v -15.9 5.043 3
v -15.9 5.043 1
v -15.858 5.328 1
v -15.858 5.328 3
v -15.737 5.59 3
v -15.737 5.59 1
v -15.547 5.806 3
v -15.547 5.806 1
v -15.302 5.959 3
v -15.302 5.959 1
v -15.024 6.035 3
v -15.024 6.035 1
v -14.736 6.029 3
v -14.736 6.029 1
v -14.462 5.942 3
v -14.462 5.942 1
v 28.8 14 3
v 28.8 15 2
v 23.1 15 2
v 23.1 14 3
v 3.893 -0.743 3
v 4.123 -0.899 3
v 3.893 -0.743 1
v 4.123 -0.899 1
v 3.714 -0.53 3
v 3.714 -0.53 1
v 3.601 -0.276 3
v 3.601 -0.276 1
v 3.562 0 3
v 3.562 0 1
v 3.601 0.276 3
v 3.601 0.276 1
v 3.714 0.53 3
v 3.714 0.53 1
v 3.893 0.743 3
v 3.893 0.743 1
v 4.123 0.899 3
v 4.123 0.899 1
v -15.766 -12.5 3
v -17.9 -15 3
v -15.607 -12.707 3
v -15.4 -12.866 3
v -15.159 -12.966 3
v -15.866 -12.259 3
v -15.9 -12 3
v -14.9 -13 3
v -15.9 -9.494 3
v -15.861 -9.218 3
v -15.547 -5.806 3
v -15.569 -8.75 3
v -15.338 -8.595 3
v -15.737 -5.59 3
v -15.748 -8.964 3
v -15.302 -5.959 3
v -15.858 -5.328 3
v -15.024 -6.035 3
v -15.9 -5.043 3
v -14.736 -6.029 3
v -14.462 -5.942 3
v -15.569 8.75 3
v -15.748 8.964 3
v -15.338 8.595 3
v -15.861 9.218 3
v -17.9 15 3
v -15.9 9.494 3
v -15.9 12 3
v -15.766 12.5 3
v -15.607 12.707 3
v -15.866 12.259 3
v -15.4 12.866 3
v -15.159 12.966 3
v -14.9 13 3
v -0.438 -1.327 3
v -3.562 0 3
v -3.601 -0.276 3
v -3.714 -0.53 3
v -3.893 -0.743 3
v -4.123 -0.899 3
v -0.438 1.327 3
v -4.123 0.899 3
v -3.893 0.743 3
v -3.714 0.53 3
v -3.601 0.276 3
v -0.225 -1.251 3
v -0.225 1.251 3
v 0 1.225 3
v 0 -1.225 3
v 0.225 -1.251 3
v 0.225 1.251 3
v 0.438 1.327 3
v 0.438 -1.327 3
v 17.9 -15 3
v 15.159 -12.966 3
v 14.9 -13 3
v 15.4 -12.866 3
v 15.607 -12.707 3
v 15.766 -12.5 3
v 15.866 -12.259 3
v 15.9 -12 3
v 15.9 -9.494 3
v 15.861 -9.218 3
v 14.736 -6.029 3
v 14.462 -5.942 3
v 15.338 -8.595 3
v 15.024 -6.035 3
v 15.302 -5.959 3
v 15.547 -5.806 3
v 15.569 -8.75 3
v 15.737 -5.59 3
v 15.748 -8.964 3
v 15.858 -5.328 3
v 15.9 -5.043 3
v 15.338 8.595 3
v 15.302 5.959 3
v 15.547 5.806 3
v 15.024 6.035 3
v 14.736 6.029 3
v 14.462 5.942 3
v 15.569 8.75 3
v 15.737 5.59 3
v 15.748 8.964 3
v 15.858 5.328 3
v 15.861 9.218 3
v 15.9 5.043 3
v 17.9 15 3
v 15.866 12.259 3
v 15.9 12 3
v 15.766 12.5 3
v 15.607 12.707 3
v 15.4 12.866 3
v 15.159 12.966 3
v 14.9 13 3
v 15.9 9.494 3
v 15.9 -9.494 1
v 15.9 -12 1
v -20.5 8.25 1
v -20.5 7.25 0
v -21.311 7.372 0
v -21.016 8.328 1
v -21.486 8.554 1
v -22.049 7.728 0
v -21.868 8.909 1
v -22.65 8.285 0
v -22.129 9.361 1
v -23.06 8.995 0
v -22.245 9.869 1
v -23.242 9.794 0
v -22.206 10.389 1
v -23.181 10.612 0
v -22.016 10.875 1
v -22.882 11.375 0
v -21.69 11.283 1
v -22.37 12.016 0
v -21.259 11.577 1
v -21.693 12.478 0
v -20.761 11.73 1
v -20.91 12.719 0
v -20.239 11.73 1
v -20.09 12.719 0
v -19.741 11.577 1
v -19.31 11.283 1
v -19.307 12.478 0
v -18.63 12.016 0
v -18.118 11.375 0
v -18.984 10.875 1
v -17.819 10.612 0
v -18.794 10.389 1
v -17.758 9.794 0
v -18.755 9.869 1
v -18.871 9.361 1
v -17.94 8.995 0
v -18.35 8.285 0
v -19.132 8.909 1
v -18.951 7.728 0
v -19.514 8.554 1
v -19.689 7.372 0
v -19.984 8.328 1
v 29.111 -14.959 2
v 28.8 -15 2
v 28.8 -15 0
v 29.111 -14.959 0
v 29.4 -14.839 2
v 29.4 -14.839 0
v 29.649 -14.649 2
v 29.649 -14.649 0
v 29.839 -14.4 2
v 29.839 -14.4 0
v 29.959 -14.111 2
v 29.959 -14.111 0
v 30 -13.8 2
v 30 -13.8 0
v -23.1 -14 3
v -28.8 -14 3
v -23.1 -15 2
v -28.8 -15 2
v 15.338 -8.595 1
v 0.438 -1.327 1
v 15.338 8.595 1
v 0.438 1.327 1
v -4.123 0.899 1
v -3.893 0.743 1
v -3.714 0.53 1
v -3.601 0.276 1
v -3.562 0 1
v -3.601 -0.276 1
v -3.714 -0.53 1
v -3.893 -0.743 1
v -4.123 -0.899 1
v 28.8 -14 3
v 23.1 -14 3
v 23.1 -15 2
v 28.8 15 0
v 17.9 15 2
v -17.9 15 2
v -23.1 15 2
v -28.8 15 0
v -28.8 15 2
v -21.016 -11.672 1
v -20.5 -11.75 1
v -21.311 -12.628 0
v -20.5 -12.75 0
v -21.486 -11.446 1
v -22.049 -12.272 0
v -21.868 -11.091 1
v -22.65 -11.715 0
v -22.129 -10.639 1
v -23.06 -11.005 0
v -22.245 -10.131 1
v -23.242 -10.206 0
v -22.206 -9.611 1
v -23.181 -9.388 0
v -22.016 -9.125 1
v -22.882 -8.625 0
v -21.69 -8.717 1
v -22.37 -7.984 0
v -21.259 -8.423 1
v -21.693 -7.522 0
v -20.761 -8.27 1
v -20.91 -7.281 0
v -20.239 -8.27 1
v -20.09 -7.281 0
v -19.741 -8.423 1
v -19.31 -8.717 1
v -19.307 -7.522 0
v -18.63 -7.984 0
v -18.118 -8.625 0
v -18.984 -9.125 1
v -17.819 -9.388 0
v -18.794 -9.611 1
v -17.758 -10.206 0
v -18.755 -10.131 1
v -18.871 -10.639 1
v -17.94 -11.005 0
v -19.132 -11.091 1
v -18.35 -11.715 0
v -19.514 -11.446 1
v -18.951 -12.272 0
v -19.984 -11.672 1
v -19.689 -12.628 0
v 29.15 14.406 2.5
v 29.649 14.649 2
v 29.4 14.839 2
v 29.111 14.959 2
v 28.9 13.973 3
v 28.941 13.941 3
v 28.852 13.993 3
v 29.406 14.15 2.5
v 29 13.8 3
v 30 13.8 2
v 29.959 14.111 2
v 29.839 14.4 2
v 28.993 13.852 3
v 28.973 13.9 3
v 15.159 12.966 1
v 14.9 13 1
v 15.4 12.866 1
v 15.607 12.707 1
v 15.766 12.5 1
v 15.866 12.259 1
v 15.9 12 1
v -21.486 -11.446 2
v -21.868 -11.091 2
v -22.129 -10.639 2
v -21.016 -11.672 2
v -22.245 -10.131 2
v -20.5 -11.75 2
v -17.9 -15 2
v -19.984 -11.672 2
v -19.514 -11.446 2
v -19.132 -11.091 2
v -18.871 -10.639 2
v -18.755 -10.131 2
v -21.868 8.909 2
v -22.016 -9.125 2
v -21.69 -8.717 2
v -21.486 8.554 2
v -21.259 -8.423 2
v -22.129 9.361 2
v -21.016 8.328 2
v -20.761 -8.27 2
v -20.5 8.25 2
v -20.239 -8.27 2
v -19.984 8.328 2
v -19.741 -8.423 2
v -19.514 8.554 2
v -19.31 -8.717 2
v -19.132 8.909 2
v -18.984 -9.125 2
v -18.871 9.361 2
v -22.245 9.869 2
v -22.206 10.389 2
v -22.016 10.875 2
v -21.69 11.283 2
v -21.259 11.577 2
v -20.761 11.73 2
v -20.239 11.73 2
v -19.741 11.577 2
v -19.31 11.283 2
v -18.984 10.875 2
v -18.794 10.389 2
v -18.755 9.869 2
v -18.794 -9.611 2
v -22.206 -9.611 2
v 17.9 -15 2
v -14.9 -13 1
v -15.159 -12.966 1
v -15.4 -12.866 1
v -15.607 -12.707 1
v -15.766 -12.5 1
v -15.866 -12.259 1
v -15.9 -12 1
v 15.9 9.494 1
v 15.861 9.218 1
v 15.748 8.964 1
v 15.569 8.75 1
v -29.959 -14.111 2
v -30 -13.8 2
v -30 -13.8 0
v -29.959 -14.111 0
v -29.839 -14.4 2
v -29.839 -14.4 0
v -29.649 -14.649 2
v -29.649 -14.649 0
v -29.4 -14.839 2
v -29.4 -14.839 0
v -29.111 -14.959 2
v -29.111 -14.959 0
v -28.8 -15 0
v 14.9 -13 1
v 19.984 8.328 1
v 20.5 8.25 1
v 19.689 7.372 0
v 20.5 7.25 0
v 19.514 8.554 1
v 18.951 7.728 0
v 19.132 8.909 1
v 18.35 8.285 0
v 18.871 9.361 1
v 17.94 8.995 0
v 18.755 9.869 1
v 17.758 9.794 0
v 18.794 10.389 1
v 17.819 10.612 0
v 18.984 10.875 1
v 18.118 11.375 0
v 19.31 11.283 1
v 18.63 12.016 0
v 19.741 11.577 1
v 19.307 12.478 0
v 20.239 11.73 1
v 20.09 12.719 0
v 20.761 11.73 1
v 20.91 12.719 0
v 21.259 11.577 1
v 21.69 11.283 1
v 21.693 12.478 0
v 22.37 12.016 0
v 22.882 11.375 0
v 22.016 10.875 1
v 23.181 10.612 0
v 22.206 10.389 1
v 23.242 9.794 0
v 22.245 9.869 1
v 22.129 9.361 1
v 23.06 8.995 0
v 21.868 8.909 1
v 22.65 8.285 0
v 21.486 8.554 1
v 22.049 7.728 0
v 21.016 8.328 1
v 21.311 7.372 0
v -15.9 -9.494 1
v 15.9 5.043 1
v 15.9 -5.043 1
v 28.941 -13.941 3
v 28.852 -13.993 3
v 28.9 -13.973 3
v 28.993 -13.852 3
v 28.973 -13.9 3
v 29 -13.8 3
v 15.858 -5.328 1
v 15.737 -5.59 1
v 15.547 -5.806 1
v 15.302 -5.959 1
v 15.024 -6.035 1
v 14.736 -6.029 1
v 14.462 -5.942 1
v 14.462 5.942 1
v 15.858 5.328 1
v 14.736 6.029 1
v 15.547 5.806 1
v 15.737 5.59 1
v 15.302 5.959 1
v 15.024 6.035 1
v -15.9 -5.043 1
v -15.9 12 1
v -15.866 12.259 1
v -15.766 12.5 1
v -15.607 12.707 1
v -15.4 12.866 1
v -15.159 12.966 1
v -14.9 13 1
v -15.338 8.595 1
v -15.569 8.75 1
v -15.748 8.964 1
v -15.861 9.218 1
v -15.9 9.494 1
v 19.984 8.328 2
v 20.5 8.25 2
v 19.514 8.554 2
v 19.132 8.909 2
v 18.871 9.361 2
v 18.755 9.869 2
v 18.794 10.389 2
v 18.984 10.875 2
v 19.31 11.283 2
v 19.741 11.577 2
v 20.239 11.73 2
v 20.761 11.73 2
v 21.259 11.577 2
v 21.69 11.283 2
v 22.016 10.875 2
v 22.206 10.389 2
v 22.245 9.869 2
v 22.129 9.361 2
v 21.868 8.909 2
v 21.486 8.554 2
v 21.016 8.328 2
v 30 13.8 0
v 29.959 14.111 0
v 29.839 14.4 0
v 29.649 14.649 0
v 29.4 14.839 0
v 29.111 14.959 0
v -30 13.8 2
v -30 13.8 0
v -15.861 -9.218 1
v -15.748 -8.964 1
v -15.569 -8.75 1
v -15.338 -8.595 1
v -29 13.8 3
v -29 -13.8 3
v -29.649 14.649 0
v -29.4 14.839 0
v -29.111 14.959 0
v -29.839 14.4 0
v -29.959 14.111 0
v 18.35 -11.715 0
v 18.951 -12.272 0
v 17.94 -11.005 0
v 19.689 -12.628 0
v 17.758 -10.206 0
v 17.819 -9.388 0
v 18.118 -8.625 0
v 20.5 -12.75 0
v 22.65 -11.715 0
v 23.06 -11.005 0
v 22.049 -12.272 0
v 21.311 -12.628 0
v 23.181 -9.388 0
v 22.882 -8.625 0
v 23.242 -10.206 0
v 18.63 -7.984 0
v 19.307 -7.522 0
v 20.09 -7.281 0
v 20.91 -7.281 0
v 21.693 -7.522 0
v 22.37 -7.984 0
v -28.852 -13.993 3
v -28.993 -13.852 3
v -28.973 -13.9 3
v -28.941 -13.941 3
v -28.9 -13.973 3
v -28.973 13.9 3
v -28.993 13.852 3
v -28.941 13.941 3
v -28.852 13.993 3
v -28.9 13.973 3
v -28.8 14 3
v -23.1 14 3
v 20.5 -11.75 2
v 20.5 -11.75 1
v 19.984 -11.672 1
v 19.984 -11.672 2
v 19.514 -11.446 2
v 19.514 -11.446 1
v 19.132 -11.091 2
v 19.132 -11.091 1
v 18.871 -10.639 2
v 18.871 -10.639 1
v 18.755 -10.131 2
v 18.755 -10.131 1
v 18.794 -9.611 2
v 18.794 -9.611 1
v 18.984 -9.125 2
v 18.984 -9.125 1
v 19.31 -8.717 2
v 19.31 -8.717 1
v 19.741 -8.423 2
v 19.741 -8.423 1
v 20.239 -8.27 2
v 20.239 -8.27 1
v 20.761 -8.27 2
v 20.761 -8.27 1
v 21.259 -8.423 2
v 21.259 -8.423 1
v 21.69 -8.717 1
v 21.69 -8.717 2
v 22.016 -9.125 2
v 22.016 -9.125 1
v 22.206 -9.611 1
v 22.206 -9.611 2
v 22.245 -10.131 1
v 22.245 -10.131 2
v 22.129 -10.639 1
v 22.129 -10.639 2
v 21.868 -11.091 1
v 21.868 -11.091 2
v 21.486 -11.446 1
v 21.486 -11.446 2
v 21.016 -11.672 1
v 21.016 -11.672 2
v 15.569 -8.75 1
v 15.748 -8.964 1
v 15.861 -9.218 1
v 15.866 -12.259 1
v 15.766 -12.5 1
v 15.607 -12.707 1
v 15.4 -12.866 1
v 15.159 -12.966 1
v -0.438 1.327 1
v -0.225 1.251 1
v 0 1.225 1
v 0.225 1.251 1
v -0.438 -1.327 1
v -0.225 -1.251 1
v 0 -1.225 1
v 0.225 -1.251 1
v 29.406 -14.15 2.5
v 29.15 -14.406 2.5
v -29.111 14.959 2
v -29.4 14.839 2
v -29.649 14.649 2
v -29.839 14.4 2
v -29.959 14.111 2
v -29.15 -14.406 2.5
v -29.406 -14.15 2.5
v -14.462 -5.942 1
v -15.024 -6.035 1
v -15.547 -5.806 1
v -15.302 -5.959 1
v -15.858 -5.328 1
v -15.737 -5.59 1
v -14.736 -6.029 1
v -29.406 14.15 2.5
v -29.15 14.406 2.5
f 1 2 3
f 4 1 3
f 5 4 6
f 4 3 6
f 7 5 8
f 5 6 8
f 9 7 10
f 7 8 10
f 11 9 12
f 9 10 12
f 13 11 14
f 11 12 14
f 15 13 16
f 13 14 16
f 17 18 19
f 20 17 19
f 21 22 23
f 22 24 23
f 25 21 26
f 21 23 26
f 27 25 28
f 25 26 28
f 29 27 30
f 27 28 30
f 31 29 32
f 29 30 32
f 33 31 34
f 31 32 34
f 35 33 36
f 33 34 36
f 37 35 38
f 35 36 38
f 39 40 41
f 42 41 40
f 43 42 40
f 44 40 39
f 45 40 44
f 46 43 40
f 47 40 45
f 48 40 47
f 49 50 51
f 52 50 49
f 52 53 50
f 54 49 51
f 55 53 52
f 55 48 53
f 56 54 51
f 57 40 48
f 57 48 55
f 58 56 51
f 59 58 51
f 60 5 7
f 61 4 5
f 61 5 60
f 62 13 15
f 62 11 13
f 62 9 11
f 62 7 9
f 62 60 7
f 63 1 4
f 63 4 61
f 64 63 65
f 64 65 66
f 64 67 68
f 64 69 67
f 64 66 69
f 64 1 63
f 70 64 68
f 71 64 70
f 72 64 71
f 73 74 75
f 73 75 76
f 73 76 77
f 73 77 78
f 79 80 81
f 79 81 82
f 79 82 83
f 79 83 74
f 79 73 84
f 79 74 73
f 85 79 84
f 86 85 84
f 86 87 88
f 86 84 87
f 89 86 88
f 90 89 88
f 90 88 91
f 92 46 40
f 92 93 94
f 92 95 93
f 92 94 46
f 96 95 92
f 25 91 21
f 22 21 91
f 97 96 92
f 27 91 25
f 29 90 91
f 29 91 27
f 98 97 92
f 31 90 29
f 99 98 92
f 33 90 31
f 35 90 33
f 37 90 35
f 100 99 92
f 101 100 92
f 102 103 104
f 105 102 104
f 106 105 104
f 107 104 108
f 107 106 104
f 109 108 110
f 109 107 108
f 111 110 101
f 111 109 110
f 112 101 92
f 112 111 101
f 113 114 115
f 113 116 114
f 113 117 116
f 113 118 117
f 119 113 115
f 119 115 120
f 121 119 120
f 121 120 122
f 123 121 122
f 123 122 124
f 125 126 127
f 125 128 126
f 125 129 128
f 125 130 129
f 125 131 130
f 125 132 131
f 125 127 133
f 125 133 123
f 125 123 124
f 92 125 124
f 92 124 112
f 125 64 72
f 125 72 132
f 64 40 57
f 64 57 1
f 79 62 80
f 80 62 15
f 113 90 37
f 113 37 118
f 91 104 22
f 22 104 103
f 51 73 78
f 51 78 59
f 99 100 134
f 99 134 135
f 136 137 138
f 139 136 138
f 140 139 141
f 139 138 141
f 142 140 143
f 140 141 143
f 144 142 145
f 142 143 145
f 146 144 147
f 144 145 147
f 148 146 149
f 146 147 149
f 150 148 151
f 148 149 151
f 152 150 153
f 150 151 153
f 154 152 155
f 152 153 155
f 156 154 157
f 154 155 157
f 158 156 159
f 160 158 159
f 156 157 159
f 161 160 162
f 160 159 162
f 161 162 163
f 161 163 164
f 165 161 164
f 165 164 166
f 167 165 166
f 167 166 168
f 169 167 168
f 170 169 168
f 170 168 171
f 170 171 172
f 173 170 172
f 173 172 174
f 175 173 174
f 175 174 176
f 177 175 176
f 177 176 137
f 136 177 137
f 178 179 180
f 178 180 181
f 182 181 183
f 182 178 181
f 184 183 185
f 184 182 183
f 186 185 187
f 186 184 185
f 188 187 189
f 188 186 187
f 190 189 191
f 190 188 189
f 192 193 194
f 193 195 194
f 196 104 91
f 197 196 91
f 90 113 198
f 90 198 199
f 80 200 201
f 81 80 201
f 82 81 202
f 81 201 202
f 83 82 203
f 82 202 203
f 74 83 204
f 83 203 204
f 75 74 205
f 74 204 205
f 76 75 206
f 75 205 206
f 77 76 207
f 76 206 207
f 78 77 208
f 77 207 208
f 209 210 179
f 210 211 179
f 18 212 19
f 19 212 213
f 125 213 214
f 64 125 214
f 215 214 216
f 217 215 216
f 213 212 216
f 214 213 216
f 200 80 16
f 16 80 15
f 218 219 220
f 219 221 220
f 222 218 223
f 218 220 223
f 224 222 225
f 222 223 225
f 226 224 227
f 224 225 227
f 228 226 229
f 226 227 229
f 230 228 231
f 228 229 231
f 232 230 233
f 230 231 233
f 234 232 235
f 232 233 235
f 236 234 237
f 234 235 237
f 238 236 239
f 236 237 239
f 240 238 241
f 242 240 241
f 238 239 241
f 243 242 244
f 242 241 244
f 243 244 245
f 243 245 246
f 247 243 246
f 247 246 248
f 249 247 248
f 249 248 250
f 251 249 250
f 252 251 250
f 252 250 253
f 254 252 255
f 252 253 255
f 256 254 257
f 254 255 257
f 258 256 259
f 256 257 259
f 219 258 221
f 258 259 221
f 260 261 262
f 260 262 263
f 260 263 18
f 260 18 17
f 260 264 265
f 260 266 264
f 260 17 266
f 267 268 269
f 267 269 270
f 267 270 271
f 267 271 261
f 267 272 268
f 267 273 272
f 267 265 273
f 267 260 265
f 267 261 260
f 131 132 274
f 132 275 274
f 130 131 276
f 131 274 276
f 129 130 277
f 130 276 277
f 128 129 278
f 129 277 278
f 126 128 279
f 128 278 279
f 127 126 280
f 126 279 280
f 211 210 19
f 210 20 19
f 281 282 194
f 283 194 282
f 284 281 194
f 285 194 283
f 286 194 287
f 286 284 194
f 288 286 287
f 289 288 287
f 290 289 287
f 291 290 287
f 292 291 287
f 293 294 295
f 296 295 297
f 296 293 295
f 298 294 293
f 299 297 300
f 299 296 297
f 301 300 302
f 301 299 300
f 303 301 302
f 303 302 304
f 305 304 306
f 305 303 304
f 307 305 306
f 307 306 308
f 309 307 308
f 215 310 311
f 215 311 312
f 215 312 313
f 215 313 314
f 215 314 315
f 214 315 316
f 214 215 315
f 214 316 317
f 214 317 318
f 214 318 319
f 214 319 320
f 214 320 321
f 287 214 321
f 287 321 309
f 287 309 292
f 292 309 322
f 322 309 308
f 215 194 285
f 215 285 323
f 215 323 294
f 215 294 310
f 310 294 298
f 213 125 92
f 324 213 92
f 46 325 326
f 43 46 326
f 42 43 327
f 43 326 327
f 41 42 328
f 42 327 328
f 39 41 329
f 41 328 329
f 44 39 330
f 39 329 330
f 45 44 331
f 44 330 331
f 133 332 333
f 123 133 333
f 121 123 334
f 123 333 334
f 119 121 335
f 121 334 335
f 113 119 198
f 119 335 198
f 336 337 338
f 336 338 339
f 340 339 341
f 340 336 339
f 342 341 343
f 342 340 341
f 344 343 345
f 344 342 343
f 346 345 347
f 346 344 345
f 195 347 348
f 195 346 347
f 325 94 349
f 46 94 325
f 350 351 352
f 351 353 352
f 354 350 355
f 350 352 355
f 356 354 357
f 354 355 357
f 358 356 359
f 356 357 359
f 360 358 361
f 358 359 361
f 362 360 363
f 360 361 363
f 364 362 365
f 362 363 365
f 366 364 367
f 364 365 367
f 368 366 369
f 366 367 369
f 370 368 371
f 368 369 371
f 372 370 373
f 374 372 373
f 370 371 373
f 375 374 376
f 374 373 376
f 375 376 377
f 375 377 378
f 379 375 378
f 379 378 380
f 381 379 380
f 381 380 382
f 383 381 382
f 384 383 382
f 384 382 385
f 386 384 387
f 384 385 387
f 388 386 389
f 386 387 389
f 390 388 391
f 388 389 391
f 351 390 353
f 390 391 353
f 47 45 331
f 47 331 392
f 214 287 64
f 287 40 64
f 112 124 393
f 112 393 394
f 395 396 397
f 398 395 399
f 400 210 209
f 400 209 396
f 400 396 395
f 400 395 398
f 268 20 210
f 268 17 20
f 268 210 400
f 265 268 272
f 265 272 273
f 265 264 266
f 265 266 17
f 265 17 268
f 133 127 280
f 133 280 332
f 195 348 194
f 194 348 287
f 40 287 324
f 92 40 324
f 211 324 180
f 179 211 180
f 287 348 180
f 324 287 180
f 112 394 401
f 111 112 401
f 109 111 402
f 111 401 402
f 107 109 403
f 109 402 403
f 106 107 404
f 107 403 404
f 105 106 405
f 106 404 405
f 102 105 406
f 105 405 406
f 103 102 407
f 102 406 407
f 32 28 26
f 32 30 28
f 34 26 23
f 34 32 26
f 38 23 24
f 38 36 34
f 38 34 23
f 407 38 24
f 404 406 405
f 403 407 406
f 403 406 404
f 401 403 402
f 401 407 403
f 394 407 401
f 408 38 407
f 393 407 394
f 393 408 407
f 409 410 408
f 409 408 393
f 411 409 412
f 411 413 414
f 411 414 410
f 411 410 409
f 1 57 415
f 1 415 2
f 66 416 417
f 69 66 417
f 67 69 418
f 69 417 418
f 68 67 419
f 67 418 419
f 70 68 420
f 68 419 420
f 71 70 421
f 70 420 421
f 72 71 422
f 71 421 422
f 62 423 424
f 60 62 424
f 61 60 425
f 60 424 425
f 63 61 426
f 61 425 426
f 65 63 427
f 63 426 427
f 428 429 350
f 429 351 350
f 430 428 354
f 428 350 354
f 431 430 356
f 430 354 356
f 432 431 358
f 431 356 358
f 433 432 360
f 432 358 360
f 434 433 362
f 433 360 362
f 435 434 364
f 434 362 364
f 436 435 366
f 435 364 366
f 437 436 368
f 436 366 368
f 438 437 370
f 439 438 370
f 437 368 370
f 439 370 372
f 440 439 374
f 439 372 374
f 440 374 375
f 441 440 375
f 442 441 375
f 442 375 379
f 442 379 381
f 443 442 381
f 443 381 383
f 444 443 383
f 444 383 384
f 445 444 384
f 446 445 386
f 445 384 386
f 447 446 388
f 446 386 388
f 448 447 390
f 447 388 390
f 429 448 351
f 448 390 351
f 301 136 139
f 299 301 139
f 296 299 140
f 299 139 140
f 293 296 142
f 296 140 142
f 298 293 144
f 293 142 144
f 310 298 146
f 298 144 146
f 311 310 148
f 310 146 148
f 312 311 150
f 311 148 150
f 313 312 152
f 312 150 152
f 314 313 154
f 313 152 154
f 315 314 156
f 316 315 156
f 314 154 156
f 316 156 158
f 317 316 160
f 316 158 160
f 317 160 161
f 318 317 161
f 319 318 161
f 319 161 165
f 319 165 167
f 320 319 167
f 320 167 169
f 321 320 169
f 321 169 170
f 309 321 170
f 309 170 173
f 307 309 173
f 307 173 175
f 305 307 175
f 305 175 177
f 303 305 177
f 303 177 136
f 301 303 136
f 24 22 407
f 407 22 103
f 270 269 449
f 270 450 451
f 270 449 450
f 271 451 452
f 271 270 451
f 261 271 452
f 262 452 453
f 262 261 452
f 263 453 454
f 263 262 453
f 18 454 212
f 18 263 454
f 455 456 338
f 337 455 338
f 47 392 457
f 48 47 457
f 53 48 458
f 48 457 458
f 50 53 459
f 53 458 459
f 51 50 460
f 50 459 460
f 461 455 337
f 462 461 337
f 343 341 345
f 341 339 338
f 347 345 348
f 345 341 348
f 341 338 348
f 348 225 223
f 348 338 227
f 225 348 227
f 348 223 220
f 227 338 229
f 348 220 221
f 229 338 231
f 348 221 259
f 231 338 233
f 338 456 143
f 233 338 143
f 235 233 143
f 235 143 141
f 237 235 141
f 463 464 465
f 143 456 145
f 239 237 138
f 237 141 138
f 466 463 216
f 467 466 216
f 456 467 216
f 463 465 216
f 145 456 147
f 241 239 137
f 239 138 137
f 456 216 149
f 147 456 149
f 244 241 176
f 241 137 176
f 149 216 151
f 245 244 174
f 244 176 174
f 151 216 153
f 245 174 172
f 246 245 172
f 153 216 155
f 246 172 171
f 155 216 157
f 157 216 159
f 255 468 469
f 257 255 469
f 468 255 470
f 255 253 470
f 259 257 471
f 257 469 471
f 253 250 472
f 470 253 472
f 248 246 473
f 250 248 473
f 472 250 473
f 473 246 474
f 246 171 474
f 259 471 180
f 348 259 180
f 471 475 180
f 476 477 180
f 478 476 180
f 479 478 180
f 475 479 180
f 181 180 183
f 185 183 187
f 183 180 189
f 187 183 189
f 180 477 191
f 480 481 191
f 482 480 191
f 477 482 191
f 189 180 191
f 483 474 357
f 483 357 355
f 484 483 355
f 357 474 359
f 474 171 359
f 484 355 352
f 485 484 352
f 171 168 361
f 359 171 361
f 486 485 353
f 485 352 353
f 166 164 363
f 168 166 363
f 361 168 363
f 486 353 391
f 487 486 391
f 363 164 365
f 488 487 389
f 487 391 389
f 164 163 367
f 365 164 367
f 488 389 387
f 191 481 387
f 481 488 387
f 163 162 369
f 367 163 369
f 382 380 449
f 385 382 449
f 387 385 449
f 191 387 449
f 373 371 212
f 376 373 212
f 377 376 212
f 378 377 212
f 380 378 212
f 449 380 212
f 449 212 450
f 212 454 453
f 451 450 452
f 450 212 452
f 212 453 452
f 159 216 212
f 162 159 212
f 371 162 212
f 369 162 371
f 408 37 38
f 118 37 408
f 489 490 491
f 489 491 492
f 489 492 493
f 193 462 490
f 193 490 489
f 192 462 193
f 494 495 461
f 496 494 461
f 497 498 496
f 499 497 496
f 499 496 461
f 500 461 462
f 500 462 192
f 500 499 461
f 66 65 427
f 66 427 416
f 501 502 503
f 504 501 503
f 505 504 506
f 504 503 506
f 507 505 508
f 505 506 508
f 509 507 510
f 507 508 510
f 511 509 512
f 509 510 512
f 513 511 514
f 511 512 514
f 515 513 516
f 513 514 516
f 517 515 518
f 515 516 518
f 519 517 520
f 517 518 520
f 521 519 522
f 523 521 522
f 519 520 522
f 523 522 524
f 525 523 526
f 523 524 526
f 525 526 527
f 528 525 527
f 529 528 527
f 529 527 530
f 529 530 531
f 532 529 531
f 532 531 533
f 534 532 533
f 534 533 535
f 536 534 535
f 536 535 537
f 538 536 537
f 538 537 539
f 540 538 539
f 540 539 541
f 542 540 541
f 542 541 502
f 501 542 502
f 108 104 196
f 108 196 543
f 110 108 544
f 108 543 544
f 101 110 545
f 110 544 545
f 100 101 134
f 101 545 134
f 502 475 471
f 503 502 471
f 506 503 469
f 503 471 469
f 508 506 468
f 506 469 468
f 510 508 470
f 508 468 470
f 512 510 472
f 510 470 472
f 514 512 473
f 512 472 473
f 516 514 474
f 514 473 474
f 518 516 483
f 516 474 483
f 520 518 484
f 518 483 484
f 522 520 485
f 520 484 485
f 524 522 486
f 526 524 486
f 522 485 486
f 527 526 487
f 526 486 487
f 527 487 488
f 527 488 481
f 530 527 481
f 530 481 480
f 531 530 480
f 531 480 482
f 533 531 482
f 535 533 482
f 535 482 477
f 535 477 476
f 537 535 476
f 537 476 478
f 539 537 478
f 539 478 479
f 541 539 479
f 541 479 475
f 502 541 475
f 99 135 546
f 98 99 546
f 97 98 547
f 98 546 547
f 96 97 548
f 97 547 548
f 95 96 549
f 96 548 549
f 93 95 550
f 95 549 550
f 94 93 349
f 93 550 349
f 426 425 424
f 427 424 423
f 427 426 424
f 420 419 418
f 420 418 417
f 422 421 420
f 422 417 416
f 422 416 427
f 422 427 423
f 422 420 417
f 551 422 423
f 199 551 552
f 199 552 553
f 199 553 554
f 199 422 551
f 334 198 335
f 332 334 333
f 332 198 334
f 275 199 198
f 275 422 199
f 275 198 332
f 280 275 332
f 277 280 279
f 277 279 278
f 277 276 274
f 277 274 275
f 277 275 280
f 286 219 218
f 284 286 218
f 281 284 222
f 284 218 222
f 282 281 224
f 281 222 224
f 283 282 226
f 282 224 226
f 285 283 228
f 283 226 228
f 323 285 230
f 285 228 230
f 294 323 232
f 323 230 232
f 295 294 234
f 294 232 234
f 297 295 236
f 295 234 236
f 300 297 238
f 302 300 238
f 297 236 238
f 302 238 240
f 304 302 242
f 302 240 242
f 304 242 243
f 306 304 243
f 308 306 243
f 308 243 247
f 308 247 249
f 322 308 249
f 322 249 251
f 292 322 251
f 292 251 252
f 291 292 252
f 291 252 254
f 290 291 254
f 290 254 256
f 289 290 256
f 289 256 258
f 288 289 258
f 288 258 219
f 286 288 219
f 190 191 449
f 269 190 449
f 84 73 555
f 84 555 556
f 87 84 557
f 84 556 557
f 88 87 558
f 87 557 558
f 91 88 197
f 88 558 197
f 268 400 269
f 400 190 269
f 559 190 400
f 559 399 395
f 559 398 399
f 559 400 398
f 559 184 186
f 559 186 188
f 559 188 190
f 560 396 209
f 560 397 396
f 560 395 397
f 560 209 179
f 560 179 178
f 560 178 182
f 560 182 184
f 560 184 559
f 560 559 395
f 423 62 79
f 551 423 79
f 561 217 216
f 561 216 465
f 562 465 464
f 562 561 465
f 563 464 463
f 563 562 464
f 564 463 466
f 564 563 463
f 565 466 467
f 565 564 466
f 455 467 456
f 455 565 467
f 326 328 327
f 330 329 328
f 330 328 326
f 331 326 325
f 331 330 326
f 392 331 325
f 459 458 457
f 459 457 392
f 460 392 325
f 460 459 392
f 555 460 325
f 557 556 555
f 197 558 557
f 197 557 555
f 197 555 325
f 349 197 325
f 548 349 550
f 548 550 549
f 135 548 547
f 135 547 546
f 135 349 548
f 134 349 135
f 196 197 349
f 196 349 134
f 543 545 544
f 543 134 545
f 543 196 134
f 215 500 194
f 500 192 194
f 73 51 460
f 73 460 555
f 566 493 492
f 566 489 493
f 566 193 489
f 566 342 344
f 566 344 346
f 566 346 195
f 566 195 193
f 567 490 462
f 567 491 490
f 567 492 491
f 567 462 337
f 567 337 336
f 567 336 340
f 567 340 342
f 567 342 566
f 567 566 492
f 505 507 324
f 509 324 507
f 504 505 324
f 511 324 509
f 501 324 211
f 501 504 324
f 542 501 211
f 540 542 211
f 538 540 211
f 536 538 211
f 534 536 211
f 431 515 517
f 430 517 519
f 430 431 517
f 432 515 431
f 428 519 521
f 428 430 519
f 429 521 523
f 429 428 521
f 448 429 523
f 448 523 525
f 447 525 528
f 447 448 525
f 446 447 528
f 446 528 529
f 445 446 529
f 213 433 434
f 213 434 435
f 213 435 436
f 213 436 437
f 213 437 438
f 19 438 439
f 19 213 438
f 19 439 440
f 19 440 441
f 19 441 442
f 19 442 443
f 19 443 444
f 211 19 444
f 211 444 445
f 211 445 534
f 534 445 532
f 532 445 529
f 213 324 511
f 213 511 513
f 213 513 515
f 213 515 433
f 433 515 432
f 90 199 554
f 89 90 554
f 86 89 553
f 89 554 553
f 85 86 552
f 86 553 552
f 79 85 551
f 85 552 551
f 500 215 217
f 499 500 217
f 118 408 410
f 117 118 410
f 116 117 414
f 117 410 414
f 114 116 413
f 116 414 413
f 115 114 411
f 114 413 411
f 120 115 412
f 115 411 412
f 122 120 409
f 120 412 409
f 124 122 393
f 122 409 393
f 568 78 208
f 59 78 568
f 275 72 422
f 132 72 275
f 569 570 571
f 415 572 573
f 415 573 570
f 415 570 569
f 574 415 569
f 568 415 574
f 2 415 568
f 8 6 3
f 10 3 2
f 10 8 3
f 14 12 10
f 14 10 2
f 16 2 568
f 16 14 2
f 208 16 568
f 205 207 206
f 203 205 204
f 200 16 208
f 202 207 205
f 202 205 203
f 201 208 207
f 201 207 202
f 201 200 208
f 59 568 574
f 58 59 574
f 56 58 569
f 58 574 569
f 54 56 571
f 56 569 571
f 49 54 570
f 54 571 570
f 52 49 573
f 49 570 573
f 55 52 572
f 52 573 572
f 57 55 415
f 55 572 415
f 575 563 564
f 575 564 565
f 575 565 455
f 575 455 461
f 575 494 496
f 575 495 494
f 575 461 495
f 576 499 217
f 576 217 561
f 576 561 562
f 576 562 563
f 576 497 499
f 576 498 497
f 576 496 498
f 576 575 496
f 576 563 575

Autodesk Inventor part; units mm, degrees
ref_plane "YZ Plane" through (0, 0, 0) normal (1, 0, 0) x (0, 1, 0)
ref_plane "XZ Plane" through (0, 0, 0) normal (0, 1, 0) x (-1, 0, 0)
ref_plane "XY Plane" through (0, 0, 0) normal (0, 0, 1) x (1, 0, 0)
sketch "スケッチ1" plane through (0, 0, 0) normal (0, 0, 1) x (1, 0, 0)
  line L0 (-30, -15) -> (30, -15)
  line L1 (30, -15) -> (30, 15)
  line L2 (30, 15) -> (-30, 15)
  line L3 (-30, 15) -> (-30, -15)
  line L4 (-30, -15) -> (30, 15) construction
  line L5 (30, -15) -> (-30, 15) construction
  point P0 (0, 0)
  dimension "d0" = 60
  dimension "d1" = 30
extrude "押し出し1" add sketch "スケッチ1" along normal blind 3
sketch "スケッチ2" plane through (0, 0, 3) normal (0, 0, 1) x (1, 0, 0)
  line L0 (30, 15) -> (-30, 15) projected
  line L1 (-30, -15) -> (30, -15) projected
  line L2 (-17.9, 15) -> (-23.1, 15)
  line L3 (-23.1, 15) -> (-23.1, -15)
  line L4 (-23.1, -15) -> (-17.9, -15)
  line L5 (-17.9, -15) -> (-17.9, 15)
  line L6 (17.9, -15) -> (23.1, -15)
  line L7 (23.1, -15) -> (23.1, 15)
  line L8 (23.1, 15) -> (17.9, 15)
  line L9 (17.9, 15) -> (17.9, -15)
  point P0 (0, 0)
  dimension "d4" = 5.2
  dimension "d5" = 5.2
  dimension "d6" = 17.9
  dimension "d7" = 17.9
extrude "押し出し2" cut sketch "スケッチ2" against normal blind 1 contours L7 L1 L9 L0 | L5 L1 L3 L0
sketch "スケッチ3" plane through (0, 0, 2) normal (0, 0, 1) x (1, 0, 0)
  line L0 (-23.1, 15) -> (-17.9, 15) projected
  line L1 (-17.9, -15) -> (-23.1, -15) projected
  line L2 (23.1, -15) -> (17.9, -15) projected
  line L3 (17.9, 15) -> (23.1, 15) projected
  line L4 (-20.5, 15) -> (-20.5, -15) construction
  line L5 (20.5, -15) -> (20.5, 15) construction
  point P0 (0, 0)
  point P1 (-20.5, 10)
  point P2 (-20.5, -10)
  point P3 (20.5, -10)
  point P4 (20.5, 10)
  dimension "d10" = 5
  dimension "d11" = 5
  dimension "d12" = 5
  dimension "d13" = 5
hole "穴1" at (-20.5, 10, 2) at (-20.5, -10, 2) at (20.5, -10, 2) at (20.5, 10, 2) direction (0, 0, -1) diameter 3.5 end through all
chamfer "面取り1" distance 1 angle 45 4 edges at (-20.5, -8.25, 0) (20.5, -8.25, 0) (-20.5, 11.75, 0) (20.5, 11.75, 0)
sketch "スケッチ4" plane through (0, 0, 3) normal (0, 0, 1) x (1, 0, 0)
  line L0 (17.9, -15) -> (17.9, 15) projected
  line L1 (17.9, 15) -> (-17.9, 15) projected
  line L2 (-17.9, 15) -> (-17.9, -15) projected
  line L3 (-17.9, -15) -> (17.9, -15) projected
  line L4 (-15.9, 13) -> (15.9, 13)
  line L5 (15.9, 13) -> (15.9, -13)
  line L6 (15.9, -13) -> (-15.9, -13)
  line L7 (-15.9, -13) -> (-15.9, 13)
  circle A0 centre (-20.5, 10) radius 1.75 projected
  circle A1 centre (20.5, -10) radius 1.75 projected
  circle A2 centre (20.5, 10) radius 1.75 projected
  circle A3 centre (-20.5, -10) radius 1.75 projected
  circle A4 centre (20.5, -10) radius 2.75 construction
  line L8 (-20.5, 10) -> (20.5, -10) construction
  line L9 (-20.5, -10) -> (20.5, 10) construction
  line L10 (-20.0616, -10.8988) -> (20.9384, 9.1012)
  line L11 (20.9384, 9.1012) -> (20.0616, 10.8988)
  line L12 (20.0616, 10.8988) -> (-20.9384, -9.1012)
  line L13 (-20.9384, -9.1012) -> (-20.0616, -10.8988)
  line L14 (-20.0616, -10.8988) -> (20.0616, 10.8988) construction
  line L15 (20.9384, 9.1012) -> (-20.9384, -9.1012) construction
  line L16 (20.0616, -10.8988) -> (-20.9384, 9.1012)
  line L17 (-20.9384, 9.1012) -> (-20.0616, 10.8988)
  line L18 (-20.0616, 10.8988) -> (20.9384, -9.1012)
  line L19 (20.9384, -9.1012) -> (20.0616, -10.8988)
  line L20 (20.0616, -10.8988) -> (-20.0616, 10.8988) construction
  line L21 (-20.9384, 9.1012) -> (20.9384, -9.1012) construction
  point P0 (0, 0)
  point P1 (15.9, -8.8687)
  point P2 (0, -1.1126)
  point P3 (-15.9, -8.8687)
  point P4 (2.2809, 0)
  point P5 (15.9, -6.6435)
  point P6 (15.9, 6.6435)
  point P7 (-2.2809, 0)
  point P8 (-15.9, 6.6435)
  point P9 (-15.9, -6.6435)
  point P10 (-15.9, 8.8687)
  point P11 (0, 1.1126)
  point P12 (15.9, 8.8687)
  dimension "d24" = 2
  dimension "d25" = 2
  dimension "d26" = 2
extrude "押し出し3" cut sketch "スケッチ4" against normal blind 2 contours L5 L6 L7 L10 L16 | L18 L10 L5 | L12 L7 L16 | L12 L18 L7 L4 L5
fillet "フィレット1" radius 1 16 edges at (-15.9, 6.6435, 2) (-15.9, -6.6435, 2) (-2.2809, 0, 2) (0, -1.1126, 2) (2.2809, 0, 2) (15.9, -6.6435, 2) (15.9, -8.8687, 2) (15.9, -13, 2) (-15.9, -13, 2) (-15.9, -8.8687, 2) (15.9, 6.6435, 2) (15.9, 8.8687, 2) (15.9, 13, 2) (-15.9, 13, 2) (-15.9, 8.8687, 2) (0, 1.1126, 2)
fillet "フィレット2" radius 1.2 4 edges at (-30, 15, 1.5) (-30, -15, 1.5) (30, -15, 1.5) (30, 15, 1.5)
chamfer "面取り2" distance 1 angle 45 10 edges at (-30, 0, 3) (-29.6485, -14.6485, 3) (-25.95, -15, 3) (-29.6485, 14.6485, 3) (-25.95, 15, 3) (30, 0, 3) (29.6485, 14.6485, 3) (25.95, 15, 3) (29.6485, -14.6485, 3) (25.95, -15, 3)
equation "\"d5\" = d4"
equation "\"d7\" = d6"
equation "\"d11\" = d10"
equation "\"d12\" = d10"
equation "\"d13\" = d10"
properties part number "3D_club_3D プリント"
